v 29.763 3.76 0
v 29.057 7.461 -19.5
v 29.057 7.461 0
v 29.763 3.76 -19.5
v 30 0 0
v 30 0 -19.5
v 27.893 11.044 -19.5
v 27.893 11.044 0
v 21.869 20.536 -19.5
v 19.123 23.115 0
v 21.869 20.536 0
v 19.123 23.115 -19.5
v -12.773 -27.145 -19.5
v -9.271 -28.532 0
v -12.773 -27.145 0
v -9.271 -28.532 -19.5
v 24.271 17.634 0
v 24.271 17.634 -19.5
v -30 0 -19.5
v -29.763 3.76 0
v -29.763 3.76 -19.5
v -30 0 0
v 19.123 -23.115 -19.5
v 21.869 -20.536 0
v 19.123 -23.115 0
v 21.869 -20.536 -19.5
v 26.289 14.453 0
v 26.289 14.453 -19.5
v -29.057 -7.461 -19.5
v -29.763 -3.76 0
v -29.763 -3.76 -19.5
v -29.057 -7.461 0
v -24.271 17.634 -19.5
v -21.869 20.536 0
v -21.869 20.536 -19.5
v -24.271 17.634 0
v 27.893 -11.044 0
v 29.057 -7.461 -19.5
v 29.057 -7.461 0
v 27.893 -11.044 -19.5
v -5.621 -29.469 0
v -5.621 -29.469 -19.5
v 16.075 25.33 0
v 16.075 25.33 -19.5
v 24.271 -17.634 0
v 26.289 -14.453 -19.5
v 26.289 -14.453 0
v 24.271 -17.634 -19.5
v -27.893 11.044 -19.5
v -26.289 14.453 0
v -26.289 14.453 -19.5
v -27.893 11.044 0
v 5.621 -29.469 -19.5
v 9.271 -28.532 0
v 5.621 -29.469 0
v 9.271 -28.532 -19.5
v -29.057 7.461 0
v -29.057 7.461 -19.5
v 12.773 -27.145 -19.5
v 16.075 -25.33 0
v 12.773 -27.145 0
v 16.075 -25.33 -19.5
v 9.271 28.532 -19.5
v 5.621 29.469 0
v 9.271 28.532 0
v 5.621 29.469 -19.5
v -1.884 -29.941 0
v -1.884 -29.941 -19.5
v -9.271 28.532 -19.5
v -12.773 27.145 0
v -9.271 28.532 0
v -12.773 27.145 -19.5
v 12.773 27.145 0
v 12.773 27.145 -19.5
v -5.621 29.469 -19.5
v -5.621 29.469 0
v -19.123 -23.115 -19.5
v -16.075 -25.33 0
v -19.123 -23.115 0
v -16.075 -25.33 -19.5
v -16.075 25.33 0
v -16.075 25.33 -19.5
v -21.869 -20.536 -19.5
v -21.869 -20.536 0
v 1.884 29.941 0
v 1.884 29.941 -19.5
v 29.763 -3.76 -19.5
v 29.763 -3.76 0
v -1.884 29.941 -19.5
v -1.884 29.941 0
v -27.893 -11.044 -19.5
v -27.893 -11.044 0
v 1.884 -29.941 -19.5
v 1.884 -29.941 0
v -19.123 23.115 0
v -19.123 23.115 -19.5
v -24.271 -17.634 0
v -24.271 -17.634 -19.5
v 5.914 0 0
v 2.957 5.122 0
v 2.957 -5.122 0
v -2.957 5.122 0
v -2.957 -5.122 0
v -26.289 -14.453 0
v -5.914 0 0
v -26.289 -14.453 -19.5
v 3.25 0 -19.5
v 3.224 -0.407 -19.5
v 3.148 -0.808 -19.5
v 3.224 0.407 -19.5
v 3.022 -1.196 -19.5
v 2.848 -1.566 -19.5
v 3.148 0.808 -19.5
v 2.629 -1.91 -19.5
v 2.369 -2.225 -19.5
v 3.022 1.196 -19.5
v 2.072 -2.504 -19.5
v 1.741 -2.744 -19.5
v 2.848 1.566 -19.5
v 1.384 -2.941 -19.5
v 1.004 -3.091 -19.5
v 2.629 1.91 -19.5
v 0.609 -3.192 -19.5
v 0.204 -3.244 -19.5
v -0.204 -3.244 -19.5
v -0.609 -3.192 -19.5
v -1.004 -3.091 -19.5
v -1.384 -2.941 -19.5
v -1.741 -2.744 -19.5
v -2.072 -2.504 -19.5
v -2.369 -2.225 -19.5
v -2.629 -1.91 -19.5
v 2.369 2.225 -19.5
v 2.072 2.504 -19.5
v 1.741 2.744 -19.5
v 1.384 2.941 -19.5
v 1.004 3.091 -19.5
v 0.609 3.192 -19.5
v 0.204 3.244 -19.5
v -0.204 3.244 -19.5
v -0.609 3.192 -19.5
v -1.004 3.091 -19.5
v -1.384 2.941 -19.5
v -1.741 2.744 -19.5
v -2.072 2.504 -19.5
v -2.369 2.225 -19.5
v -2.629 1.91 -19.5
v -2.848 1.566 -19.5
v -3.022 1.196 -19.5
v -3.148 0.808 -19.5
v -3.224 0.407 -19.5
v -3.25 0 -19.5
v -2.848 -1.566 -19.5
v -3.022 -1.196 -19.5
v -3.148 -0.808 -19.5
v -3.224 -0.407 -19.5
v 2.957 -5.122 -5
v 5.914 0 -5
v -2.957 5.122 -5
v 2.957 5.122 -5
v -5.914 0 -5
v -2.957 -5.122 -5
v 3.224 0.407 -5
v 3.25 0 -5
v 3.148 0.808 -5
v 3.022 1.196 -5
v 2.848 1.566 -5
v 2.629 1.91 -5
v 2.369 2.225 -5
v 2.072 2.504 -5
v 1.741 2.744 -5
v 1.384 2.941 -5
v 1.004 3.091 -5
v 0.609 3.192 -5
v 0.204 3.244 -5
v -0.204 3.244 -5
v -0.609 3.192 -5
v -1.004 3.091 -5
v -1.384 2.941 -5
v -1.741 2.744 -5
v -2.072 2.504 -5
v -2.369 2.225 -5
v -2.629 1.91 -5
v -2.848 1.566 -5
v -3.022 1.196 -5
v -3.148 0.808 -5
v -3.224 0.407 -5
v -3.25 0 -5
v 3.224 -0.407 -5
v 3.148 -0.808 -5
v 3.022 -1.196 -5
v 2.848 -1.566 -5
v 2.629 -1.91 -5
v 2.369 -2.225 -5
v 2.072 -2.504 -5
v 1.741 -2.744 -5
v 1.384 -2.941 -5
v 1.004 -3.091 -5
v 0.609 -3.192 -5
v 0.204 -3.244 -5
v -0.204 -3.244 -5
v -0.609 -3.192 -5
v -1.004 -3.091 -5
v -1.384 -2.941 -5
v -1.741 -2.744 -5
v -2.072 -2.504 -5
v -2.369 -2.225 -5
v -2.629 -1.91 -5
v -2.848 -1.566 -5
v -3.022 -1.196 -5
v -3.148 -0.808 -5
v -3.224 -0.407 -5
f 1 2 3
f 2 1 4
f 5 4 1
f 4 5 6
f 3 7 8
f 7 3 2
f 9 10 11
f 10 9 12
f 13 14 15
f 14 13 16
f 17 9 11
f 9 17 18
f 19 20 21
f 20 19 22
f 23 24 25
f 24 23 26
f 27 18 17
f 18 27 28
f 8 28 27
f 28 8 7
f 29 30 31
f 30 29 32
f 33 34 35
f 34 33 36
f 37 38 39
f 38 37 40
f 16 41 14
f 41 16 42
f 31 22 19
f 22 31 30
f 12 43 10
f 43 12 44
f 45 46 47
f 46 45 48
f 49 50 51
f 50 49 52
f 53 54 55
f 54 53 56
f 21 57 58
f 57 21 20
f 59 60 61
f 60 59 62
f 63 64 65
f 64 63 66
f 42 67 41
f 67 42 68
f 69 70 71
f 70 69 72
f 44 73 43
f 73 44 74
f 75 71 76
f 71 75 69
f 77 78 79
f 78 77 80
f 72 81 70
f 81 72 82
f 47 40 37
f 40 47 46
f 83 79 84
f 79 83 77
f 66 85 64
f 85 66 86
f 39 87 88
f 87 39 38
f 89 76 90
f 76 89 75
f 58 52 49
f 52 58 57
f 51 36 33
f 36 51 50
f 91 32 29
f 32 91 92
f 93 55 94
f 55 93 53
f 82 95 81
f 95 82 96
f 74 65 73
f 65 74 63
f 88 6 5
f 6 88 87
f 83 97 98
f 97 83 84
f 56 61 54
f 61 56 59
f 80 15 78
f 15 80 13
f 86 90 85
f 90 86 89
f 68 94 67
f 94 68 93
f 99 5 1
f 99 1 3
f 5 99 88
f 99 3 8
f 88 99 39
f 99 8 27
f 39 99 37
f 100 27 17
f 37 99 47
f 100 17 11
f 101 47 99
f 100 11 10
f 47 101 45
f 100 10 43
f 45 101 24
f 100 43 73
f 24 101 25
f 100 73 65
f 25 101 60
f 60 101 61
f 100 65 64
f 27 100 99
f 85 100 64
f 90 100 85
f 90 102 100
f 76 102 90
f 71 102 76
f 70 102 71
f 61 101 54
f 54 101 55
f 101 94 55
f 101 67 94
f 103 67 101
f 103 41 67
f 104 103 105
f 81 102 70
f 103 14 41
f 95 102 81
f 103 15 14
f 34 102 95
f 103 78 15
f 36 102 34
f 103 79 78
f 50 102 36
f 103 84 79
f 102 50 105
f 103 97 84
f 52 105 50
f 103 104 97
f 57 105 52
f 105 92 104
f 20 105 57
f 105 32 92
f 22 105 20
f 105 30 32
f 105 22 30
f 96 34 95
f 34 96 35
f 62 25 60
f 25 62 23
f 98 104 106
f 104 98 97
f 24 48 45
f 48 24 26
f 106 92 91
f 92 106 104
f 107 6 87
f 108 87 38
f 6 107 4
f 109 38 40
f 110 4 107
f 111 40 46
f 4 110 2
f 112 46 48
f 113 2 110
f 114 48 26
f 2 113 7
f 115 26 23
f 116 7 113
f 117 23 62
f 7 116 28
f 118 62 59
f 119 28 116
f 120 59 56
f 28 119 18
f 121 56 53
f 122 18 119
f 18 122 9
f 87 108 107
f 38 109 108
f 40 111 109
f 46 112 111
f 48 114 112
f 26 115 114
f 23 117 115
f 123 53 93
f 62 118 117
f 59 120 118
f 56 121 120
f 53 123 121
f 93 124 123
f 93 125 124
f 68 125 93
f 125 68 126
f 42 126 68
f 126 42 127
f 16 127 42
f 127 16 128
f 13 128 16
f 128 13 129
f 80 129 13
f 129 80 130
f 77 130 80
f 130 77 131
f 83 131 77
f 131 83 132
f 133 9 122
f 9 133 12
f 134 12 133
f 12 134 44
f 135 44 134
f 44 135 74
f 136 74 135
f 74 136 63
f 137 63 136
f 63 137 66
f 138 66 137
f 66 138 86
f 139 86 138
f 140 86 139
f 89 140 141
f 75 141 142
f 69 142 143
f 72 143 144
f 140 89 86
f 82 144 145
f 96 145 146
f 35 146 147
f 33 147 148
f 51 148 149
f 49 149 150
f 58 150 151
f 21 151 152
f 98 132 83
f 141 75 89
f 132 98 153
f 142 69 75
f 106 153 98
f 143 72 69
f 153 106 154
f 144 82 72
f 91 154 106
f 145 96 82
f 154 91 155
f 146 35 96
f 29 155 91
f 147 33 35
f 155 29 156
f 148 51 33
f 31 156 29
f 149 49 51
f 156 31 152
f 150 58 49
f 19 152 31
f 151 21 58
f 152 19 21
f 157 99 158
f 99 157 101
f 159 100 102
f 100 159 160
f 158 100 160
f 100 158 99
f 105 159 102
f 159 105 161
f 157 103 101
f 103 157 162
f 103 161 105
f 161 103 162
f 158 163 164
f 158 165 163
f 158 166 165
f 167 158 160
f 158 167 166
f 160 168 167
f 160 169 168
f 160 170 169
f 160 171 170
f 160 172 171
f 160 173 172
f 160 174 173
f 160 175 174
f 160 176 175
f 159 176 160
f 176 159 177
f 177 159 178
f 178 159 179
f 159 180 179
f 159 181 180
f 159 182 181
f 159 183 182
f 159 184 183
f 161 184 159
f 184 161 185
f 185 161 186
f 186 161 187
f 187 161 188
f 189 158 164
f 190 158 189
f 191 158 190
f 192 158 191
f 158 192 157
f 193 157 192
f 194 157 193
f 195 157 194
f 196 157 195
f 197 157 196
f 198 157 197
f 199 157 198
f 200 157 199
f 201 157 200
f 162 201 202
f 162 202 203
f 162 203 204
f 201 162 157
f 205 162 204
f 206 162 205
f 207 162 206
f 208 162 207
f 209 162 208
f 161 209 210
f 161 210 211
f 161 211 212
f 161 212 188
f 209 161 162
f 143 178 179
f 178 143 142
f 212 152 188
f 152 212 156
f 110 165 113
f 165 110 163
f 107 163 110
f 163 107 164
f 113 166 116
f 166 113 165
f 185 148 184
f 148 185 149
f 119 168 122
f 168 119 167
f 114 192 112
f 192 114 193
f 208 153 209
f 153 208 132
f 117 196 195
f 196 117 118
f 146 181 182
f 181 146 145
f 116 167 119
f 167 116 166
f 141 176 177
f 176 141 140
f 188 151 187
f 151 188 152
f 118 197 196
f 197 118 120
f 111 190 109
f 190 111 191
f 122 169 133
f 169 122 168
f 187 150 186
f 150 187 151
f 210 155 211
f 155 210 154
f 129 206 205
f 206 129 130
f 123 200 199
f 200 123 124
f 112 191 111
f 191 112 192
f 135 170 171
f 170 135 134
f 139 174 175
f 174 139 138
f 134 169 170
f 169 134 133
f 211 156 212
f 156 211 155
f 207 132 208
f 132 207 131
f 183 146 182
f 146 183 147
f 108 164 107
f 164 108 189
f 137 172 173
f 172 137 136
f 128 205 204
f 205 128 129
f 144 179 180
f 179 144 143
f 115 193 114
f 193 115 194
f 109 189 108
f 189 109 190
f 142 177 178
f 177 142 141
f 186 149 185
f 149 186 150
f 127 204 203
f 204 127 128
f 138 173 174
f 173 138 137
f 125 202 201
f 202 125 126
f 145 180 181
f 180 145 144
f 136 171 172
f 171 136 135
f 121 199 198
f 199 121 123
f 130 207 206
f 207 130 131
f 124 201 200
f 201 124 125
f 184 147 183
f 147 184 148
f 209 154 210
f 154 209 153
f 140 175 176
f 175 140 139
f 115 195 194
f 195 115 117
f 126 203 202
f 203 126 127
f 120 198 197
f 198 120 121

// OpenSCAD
$fn = 50;

difference() {
	union() {
		translate(v = [0, 0, -19.5]) {
			cylinder(h = 19.5, r = 30.0);
		}
		#translate(v = [0, 0, -21.0]) {
			cylinder(h = 21, r = 2.875);
		}
	}
	union() {
		translate(v = [0, 0, 0]) {
			rotate(a = [0, 0, 0]) {
				difference() {
					union() {
						translate(v = [0, 0, -5]) {
							linear_extrude(height = 5) {
								polygon(points = [[5.914249999999999, 0.0], [2.957125, 5.1218907443321156], [-2.9571249999999982, 5.1218907443321156], [-5.914249999999999, 7.242867331857232e-16], [-2.9571250000000022, -5.121890744332115], [2.9571249999999956, -5.121890744332118]]);
							}
						}
					}
					union();
				}
			}
		}
		#translate(v = [0, 0, -100.0]) {
			cylinder(h = 200, r = 3.25);
		}
	}
}
